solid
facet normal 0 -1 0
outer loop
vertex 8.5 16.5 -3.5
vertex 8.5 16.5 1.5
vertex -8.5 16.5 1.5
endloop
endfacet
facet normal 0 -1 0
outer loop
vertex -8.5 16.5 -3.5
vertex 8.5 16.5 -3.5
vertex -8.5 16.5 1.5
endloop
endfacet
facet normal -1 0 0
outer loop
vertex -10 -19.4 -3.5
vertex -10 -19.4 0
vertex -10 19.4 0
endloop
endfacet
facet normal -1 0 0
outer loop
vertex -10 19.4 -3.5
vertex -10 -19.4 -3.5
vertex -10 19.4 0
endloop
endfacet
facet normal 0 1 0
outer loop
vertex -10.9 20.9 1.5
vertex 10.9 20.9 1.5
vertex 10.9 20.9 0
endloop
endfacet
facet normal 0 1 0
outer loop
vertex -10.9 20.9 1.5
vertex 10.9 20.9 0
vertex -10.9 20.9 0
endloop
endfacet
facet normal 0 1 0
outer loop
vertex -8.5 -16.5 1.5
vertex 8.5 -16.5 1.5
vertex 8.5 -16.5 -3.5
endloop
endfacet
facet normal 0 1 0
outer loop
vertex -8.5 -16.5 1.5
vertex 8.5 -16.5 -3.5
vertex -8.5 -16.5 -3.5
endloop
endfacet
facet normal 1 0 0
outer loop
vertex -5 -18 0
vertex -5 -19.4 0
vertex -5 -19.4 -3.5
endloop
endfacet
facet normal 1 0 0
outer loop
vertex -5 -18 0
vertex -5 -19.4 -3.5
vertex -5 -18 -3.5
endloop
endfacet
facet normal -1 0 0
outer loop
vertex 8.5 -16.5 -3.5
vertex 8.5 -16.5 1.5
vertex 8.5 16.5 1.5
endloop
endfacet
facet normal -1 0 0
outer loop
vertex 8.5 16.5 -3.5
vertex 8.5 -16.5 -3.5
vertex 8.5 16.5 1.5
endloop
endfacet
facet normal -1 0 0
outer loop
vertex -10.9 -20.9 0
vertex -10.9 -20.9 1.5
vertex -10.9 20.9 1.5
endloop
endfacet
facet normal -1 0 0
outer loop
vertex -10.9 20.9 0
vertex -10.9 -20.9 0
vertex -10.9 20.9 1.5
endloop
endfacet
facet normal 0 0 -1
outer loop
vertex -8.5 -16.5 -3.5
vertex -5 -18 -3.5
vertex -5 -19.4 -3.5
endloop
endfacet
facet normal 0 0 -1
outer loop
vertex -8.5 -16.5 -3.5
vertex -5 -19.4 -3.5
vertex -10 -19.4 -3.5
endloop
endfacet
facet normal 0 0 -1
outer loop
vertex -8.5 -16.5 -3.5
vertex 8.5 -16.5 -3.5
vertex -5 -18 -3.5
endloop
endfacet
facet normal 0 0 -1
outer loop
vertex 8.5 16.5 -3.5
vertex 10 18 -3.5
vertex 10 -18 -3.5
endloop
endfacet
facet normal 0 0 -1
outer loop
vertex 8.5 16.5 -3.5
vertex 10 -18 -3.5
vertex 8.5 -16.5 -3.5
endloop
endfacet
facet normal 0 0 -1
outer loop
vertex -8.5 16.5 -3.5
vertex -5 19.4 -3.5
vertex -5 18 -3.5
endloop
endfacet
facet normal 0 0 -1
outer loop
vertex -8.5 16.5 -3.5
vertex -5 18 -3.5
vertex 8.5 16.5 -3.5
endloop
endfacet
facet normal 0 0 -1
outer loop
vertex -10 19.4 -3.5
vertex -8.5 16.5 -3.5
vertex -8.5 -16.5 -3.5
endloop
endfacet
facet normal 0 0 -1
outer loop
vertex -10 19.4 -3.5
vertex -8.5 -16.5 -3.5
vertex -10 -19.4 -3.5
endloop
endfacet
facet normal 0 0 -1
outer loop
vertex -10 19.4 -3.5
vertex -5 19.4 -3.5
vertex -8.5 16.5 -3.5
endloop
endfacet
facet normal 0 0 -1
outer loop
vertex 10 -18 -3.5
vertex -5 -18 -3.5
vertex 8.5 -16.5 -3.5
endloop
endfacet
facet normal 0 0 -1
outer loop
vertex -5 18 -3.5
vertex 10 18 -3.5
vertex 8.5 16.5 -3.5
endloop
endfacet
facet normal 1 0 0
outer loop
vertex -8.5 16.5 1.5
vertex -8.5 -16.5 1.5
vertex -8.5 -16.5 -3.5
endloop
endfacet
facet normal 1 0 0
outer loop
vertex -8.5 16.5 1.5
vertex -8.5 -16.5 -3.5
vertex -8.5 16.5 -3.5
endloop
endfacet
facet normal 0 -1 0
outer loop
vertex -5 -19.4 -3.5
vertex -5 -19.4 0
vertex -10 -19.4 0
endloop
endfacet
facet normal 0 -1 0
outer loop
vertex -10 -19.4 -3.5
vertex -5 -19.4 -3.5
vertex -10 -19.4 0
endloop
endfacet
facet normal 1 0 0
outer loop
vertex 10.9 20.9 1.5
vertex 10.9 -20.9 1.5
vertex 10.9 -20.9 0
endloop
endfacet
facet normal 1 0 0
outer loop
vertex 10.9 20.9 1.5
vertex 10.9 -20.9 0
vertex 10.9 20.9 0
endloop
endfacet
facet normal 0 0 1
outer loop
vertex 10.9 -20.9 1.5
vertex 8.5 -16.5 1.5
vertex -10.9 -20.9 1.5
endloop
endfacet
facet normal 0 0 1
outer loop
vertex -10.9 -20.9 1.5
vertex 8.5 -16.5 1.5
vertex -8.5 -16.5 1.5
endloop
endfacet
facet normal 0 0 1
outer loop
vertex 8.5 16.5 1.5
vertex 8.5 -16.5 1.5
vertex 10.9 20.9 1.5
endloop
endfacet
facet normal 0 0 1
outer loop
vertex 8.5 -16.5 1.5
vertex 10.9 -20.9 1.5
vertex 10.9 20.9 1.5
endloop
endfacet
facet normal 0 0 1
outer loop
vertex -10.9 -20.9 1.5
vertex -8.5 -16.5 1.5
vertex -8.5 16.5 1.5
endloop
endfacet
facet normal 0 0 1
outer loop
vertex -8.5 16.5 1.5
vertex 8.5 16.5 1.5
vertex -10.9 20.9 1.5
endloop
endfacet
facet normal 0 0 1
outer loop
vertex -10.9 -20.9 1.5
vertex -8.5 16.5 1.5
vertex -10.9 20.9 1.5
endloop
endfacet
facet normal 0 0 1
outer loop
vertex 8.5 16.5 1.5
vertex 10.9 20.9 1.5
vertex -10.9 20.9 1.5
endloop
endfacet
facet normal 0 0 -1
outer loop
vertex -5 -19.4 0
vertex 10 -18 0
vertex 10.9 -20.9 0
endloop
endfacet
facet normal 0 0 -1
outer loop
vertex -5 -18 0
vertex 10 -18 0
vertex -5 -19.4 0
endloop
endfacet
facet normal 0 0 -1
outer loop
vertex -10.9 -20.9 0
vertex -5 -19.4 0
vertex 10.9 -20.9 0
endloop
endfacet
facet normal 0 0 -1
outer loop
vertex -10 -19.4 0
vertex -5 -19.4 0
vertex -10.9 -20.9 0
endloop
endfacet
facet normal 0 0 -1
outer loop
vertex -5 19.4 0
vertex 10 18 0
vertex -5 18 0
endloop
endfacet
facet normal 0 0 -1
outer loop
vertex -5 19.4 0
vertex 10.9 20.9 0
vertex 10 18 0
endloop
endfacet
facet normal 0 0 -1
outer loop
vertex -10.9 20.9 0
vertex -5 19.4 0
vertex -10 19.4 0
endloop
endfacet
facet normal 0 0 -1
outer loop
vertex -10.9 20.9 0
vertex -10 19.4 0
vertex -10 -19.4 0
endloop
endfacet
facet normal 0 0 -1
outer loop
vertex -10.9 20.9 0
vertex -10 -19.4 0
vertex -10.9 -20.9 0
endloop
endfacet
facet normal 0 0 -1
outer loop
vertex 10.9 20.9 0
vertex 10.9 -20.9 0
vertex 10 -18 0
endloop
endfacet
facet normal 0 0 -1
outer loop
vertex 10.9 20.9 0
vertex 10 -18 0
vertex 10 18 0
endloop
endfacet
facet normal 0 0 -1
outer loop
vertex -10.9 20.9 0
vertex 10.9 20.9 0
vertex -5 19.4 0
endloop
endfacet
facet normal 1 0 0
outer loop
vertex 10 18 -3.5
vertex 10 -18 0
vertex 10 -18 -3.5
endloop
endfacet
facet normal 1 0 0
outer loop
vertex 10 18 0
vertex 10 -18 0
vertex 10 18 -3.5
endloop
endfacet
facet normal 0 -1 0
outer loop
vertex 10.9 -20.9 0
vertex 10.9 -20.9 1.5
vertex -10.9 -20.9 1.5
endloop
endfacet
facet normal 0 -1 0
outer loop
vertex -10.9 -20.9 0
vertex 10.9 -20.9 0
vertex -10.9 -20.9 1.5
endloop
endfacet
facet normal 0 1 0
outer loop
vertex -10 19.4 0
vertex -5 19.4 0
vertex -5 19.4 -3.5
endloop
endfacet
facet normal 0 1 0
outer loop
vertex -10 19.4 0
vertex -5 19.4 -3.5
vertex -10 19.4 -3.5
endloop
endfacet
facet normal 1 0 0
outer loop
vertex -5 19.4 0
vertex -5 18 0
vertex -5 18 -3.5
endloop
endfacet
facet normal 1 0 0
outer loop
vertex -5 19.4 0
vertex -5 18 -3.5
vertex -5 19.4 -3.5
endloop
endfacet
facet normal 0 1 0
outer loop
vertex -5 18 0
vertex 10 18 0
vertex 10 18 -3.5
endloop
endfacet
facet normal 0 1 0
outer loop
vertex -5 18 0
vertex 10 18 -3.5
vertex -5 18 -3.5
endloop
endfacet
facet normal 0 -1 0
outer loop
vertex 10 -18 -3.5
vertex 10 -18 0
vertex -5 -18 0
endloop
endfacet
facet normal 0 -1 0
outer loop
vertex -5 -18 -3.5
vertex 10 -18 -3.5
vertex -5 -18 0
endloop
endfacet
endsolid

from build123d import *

# Parameters (mm, degrees)
BOX003_W                  = 5
BOX003_H                  = 2
BOX003_DEPTH              = 5
BOX005_W                  = 5
BOX005_H                  = 2
BOX005_DEPTH              = 5
BOX002_W                  = 17
BOX002_H                  = 33
BOX002_DEPTH              = 5
BOX001_W                  = 20
BOX001_H                  = 36
BOX001_DEPTH              = 5
BOX_W                     = 21.8
BOX_H                     = 41.8
BOX_DEPTH                 = 1.5
FUSION004_PLACEMENT_ANGLE = 180


with BuildPart() as cube001:
    # Box003 → Box003 (new body)
    with BuildSketch(Plane(origin=(-10, 17.4, 0), x_dir=(1, 0, 0), z_dir=(0, 0, 1))):
        with Locations((2.5, 1)):
            Rectangle(BOX003_W, BOX003_H)
    extrude(amount=BOX003_DEPTH)


with BuildPart() as fusion003:
    # Box005 → Box005 (new body)
    with BuildSketch(Plane(origin=(-10, -19.4, 0), x_dir=(1, 0, 0), z_dir=(0, 0, 1))):
        with Locations((2.5, 1)):
            Rectangle(BOX005_W, BOX005_H)
    extrude(amount=BOX005_DEPTH)

    # Fusion003: union Cube001
    add(cube001.part)


with BuildPart() as fusion003_1:
    # Fusion003 placement: moved
    add(fusion003.part.moved(Location((15, 0, 0))))


with BuildPart() as cut:
    # Box002 → Box002 (new body)
    with BuildSketch(Plane(origin=(-8.5, -16.5, 0), x_dir=(1, 0, 0), z_dir=(0, 0, 1))):
        with Locations((8.5, 16.5)):
            Rectangle(BOX002_W, BOX002_H)
    extrude(amount=BOX002_DEPTH)


with BuildPart() as cube:
    # Box001 → Box001 (new body)
    with BuildSketch(Plane(origin=(-10, -18, 0), x_dir=(1, 0, 0), z_dir=(0, 0, 1))):
        with Locations((10, 18)):
            Rectangle(BOX001_W, BOX001_H)
    extrude(amount=BOX001_DEPTH)


with BuildPart() as basesensoruppermount:
    # Box → Box (new body)
    with BuildSketch(Plane(origin=(-10.9, -20.9, 0), x_dir=(1, 0, 0), z_dir=(0, 0, 1))):
        with Locations((10.9, 20.9)):
            Rectangle(BOX_W, BOX_H)
    extrude(amount=BOX_DEPTH)

    # Fusion: union Cube
    add(cube.part)

    # Cut: cut cut
    add(cut.part, mode=Mode.SUBTRACT)

    # Fusion004: union Fusion003
    add(fusion003_1.part)


with BuildPart() as basesensoruppermount_1:
    # Fusion004 placement: moved
    add(basesensoruppermount.part.moved(Location((0, 0, 1.5))).rotate(Axis((0, 0, 1.5), (0, 1, 0)), FUSION004_PLACEMENT_ANGLE))


solid = basesensoruppermount_1.part
